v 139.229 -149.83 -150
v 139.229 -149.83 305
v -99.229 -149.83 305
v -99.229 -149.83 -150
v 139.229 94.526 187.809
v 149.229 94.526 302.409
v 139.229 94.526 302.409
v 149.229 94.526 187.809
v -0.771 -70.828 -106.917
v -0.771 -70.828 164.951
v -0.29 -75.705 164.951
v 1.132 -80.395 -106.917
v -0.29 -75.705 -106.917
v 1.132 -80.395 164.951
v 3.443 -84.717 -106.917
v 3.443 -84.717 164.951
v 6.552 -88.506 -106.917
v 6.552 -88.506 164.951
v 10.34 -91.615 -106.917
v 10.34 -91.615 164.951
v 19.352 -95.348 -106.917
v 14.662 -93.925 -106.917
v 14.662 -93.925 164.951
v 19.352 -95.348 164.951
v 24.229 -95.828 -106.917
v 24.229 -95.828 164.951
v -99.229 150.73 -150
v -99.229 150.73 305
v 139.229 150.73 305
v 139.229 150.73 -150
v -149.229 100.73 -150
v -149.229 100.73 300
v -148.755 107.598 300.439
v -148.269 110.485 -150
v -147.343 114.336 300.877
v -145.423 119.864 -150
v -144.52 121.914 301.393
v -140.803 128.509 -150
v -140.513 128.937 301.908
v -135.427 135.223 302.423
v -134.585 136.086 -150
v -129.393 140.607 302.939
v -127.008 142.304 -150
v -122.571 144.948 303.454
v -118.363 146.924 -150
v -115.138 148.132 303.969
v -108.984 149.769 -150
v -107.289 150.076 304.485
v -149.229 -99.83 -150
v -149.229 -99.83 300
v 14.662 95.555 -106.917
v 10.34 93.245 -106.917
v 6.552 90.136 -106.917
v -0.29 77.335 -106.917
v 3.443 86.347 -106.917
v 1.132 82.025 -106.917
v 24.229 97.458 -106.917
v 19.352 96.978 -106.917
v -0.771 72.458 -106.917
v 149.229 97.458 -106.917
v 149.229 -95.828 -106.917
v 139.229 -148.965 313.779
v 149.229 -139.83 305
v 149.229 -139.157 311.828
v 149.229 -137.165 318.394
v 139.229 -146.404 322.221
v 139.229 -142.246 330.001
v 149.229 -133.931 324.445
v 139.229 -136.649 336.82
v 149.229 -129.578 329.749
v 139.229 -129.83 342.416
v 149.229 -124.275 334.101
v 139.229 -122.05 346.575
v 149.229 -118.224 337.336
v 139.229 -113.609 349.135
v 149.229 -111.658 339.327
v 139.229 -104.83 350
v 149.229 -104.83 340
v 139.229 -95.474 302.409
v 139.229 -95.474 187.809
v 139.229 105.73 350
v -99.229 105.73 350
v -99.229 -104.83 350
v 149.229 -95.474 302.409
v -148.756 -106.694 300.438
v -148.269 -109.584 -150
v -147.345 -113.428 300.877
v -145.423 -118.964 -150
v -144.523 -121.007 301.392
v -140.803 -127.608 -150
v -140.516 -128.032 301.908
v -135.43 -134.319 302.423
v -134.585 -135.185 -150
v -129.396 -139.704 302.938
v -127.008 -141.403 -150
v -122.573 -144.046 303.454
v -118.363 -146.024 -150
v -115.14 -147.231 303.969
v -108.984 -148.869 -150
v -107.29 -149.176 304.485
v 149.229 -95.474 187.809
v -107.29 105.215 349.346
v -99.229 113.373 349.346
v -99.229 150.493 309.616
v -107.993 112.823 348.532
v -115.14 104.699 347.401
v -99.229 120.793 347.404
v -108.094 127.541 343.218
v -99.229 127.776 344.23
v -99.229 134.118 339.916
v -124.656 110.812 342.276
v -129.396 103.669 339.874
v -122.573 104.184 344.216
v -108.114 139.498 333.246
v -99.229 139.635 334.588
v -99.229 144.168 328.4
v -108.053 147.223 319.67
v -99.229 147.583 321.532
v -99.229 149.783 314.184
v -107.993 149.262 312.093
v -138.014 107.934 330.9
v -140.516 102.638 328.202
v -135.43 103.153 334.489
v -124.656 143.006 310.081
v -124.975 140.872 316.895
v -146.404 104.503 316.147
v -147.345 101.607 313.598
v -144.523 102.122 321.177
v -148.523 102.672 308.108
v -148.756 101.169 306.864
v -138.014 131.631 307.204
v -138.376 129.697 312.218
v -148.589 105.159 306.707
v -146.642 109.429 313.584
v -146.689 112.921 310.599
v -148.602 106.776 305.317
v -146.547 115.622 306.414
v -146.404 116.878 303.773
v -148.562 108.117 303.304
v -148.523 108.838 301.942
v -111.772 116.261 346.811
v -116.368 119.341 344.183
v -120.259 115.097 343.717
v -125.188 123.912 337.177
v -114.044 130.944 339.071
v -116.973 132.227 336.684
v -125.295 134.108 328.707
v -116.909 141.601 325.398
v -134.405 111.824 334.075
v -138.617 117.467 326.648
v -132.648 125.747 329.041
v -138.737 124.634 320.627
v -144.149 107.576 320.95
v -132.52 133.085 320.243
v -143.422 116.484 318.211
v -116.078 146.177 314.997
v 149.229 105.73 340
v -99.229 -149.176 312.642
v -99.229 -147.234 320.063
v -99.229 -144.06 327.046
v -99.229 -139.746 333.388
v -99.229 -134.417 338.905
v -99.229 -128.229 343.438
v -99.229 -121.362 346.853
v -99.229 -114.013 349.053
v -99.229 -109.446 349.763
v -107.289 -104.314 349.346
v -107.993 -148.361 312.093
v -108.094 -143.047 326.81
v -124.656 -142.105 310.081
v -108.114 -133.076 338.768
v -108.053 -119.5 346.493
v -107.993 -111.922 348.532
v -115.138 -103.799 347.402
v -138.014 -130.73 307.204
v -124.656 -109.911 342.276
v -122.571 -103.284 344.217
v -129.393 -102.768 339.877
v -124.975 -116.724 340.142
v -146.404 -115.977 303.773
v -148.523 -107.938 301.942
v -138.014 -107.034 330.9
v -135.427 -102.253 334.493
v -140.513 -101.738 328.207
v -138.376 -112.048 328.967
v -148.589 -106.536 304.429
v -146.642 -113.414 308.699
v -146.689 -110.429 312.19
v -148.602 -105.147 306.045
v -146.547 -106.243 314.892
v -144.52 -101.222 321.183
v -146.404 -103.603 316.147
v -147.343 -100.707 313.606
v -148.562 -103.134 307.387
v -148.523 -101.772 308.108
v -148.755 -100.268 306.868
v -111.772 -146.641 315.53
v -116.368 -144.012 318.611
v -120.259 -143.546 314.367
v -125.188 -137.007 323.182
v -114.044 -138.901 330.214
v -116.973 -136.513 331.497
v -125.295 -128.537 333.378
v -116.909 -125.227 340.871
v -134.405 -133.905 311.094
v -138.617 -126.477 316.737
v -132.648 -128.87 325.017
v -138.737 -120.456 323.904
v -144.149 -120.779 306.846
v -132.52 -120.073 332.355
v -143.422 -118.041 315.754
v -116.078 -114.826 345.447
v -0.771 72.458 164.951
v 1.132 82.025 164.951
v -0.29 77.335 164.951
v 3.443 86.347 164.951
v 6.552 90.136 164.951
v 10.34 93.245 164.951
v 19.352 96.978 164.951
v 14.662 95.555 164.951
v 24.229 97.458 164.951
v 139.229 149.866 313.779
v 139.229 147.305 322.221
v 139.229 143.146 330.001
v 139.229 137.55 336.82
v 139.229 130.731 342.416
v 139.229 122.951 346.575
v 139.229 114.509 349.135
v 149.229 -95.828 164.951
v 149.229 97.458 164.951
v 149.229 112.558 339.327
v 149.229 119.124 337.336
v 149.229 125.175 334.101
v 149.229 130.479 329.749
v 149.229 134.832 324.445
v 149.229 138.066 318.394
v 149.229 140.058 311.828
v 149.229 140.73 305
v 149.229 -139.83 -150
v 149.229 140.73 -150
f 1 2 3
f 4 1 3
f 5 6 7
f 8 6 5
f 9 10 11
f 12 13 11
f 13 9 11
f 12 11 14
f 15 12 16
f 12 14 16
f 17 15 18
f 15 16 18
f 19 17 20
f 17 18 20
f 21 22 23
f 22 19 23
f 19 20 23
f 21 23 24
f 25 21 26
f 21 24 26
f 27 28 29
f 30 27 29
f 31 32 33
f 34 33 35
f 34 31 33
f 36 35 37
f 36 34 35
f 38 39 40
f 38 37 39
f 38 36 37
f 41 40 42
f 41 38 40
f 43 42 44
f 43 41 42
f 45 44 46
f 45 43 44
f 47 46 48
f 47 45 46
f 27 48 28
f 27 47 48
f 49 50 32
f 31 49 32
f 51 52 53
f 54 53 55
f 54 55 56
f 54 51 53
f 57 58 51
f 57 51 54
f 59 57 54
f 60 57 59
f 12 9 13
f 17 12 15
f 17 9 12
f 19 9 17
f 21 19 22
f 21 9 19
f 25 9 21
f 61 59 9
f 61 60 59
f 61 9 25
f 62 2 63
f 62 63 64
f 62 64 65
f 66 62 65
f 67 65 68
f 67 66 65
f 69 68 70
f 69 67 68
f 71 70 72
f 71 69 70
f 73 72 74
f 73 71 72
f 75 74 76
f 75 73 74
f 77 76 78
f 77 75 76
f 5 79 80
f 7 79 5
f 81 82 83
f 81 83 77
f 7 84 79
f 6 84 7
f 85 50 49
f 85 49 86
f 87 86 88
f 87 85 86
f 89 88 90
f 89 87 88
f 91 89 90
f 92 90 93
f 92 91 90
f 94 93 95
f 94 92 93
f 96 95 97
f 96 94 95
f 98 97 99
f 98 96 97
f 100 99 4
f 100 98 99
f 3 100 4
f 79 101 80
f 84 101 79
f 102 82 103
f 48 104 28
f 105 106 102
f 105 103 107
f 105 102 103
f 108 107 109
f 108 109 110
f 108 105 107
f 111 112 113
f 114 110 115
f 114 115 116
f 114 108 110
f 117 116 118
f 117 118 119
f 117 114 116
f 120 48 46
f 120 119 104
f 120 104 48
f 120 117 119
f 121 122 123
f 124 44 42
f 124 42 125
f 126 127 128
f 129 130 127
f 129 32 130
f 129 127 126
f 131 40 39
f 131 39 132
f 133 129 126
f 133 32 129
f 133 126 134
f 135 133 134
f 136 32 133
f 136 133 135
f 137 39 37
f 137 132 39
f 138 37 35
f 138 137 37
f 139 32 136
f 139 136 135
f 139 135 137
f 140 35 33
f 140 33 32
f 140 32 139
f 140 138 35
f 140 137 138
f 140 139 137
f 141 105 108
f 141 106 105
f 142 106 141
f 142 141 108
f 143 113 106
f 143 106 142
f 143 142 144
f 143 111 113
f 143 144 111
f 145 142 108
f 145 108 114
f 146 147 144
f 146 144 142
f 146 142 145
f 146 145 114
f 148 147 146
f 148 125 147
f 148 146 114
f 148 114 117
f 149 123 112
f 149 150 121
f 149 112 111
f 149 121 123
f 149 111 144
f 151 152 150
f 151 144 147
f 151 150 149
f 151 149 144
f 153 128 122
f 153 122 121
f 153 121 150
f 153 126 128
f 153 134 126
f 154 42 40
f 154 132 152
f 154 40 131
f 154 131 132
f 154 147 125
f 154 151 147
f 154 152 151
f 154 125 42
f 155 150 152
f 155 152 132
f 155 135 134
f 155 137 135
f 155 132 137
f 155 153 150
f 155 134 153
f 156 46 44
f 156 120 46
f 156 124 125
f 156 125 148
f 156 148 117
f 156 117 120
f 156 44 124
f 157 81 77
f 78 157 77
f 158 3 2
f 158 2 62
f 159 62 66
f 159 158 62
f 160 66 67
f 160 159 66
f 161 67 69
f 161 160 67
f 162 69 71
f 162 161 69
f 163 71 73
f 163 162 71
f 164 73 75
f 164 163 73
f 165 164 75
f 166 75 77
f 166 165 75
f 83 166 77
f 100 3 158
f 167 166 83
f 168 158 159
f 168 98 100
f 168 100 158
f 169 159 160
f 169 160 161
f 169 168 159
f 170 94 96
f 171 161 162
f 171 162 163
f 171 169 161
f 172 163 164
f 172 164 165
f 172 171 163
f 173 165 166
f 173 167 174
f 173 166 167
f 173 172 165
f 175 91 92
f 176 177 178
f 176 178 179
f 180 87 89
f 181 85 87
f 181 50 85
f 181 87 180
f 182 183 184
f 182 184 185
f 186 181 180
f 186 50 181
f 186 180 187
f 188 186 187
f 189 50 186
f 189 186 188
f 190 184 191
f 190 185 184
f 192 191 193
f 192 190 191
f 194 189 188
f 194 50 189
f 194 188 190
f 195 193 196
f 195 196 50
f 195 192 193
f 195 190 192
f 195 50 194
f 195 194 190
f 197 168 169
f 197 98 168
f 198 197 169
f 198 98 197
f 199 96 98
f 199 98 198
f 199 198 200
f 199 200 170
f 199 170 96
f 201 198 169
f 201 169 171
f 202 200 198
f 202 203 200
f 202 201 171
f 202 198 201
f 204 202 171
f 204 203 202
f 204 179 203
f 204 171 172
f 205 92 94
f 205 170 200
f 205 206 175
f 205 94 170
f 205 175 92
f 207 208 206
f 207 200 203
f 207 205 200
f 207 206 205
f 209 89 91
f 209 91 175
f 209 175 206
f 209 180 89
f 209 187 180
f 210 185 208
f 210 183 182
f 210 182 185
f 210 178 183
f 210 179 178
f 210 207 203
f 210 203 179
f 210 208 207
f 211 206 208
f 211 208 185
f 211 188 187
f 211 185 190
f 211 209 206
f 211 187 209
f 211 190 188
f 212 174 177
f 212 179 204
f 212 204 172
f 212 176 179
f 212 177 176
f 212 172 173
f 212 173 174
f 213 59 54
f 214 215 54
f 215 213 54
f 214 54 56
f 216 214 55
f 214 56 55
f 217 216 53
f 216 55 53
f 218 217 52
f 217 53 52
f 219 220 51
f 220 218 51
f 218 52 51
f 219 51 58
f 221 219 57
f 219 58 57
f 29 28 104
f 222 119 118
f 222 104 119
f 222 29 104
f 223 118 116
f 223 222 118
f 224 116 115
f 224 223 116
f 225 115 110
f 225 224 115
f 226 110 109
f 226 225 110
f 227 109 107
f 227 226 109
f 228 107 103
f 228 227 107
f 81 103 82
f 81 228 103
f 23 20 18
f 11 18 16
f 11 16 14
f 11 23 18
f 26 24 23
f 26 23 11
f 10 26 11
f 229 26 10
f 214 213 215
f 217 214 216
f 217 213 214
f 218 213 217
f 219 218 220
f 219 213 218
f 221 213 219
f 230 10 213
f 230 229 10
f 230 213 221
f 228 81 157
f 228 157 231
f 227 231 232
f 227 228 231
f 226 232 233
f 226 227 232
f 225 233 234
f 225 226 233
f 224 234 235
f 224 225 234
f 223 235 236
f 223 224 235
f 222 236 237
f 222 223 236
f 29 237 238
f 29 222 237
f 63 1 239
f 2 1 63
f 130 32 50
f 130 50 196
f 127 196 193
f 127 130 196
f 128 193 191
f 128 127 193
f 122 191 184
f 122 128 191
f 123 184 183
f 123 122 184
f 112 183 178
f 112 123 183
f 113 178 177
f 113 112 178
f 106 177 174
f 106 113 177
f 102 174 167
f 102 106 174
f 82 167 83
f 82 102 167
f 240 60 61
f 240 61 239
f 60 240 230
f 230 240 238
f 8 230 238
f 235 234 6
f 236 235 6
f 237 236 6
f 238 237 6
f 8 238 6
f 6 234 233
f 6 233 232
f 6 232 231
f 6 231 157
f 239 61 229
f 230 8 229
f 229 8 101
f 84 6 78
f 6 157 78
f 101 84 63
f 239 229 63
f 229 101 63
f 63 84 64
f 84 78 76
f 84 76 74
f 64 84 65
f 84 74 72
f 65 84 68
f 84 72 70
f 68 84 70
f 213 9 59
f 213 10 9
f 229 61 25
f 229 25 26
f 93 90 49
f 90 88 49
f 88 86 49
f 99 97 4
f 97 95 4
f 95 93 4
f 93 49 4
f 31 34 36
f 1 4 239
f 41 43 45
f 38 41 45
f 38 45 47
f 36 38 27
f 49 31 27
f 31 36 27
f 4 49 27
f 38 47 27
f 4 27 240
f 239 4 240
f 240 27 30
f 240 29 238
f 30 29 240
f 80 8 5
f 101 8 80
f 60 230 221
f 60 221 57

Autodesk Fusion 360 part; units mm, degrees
sketch "Sketch1" plane through (0, 0, 0) normal (0, 0, 1) x (1, 0, 0)
ref_plane "WorkPlane1" through (0, 0, 350) normal (0, 0, 1) x (1, 0, 0)
sketch "Sketch2" plane through (0, 0, 350) normal (0, 0, 1) x (1, 0, 0)
  line L0 (-149.2293, 150.7302) -> (149.2293, 150.7302)
  line L1 (149.2293, 150.7302) -> (149.2293, -149.8296)
  line L2 (149.2293, -149.8296) -> (-149.2293, -149.8296)
  line L3 (-149.2293, -149.8296) -> (-149.2293, 150.7302)
  dimension "d12" = 298.4585
extrude "Extrude1" add sketch "Sketch2" against normal blind 500
fillet "Fillet1" radius 45 2 edges at (0, -149.8296, 350) (0, 150.7302, 350)
sketch "Sketch3" plane through (149.2293, 0, 0) normal (1, 0, 0) x (0, 1, 0)
  arc A0 (150.7302, 305) -> (105.7302, 350) centre (105.7302, 305) ccw
  line L0 (105.7302, 350) -> (-104.8296, 350)
  arc A1 (-104.8296, 350) -> (-149.8296, 305) centre (-104.8296, 305) ccw
  line L1 (-149.8296, 305) -> (-149.8296, -150)
  line L2 (-149.8296, -150) -> (150.7302, -150)
  line L3 (150.7302, -150) -> (150.7302, 305)
  line L4 (-95.4736, 302.4093) -> (94.5264, 302.4093)
  line L5 (94.5264, 302.4093) -> (94.5264, 187.809)
  line L6 (94.5264, 187.809) -> (-95.4736, 187.809)
  line L7 (-95.4736, 187.809) -> (-95.4736, 302.4093)
extrude "Extrude2" cut sketch "Sketch3" against normal blind 10 contours L4 L5 L6 L7
sketch "Sketch4" plane through (149.2293, 0, 0) normal (1, 0, 0) x (0, 1, 0)
  line L0 (94.5264, 302.4093) -> (94.5264, 187.809)
  line L1 (94.5264, 187.809) -> (-95.4736, 187.809)
  line L2 (-95.4736, 187.809) -> (-95.4736, 302.4093)
  line L3 (-95.4736, 302.4093) -> (94.5264, 302.4093)
  arc A0 (150.7302, 305) -> (105.7302, 350) centre (105.7302, 305) ccw
  line L4 (105.7302, 350) -> (-104.8296, 350)
  arc A1 (-104.8296, 350) -> (-149.8296, 305) centre (-104.8296, 305) ccw
  line L5 (-149.8296, 305) -> (-149.8296, -150)
  line L6 (-149.8296, -150) -> (150.7302, -150)
  line L7 (150.7302, -150) -> (150.7302, 305)
  line L8 (-95.828, 164.9511) -> (97.4581, 164.9511)
  line L9 (97.4581, 164.9511) -> (97.4581, -106.9169)
  line L10 (97.4581, -106.9169) -> (-95.828, -106.9169)
  line L11 (-95.828, -106.9169) -> (-95.828, 164.9511)
extrude "Extrude3" cut sketch "Sketch4" against normal blind 150 contours L8 L9 L10 L11
fillet "Fillet2" radius 25 2 edges at (-0.7707, 97.4581, 29.0171) (-0.7707, -95.828, 29.0171)
chamfer "Chamfer1" distance 10 angle 45 5 edges at (149.2293, 150.7302, 77.5) (149.2293, 137.55, 336.8198) (149.2293, 0.4503, 350) (149.2293, -136.6494, 336.8198) (149.2293, -149.8296, 77.5)
fillet "Fillet3" radius 50 5 edges at (-149.2293, 150.7302, 77.5) (-149.2293, 137.55, 336.8198) (-149.2293, 0.4503, 350) (-149.2293, -136.6494, 336.8198) (-149.2293, -149.8296, 77.5)
